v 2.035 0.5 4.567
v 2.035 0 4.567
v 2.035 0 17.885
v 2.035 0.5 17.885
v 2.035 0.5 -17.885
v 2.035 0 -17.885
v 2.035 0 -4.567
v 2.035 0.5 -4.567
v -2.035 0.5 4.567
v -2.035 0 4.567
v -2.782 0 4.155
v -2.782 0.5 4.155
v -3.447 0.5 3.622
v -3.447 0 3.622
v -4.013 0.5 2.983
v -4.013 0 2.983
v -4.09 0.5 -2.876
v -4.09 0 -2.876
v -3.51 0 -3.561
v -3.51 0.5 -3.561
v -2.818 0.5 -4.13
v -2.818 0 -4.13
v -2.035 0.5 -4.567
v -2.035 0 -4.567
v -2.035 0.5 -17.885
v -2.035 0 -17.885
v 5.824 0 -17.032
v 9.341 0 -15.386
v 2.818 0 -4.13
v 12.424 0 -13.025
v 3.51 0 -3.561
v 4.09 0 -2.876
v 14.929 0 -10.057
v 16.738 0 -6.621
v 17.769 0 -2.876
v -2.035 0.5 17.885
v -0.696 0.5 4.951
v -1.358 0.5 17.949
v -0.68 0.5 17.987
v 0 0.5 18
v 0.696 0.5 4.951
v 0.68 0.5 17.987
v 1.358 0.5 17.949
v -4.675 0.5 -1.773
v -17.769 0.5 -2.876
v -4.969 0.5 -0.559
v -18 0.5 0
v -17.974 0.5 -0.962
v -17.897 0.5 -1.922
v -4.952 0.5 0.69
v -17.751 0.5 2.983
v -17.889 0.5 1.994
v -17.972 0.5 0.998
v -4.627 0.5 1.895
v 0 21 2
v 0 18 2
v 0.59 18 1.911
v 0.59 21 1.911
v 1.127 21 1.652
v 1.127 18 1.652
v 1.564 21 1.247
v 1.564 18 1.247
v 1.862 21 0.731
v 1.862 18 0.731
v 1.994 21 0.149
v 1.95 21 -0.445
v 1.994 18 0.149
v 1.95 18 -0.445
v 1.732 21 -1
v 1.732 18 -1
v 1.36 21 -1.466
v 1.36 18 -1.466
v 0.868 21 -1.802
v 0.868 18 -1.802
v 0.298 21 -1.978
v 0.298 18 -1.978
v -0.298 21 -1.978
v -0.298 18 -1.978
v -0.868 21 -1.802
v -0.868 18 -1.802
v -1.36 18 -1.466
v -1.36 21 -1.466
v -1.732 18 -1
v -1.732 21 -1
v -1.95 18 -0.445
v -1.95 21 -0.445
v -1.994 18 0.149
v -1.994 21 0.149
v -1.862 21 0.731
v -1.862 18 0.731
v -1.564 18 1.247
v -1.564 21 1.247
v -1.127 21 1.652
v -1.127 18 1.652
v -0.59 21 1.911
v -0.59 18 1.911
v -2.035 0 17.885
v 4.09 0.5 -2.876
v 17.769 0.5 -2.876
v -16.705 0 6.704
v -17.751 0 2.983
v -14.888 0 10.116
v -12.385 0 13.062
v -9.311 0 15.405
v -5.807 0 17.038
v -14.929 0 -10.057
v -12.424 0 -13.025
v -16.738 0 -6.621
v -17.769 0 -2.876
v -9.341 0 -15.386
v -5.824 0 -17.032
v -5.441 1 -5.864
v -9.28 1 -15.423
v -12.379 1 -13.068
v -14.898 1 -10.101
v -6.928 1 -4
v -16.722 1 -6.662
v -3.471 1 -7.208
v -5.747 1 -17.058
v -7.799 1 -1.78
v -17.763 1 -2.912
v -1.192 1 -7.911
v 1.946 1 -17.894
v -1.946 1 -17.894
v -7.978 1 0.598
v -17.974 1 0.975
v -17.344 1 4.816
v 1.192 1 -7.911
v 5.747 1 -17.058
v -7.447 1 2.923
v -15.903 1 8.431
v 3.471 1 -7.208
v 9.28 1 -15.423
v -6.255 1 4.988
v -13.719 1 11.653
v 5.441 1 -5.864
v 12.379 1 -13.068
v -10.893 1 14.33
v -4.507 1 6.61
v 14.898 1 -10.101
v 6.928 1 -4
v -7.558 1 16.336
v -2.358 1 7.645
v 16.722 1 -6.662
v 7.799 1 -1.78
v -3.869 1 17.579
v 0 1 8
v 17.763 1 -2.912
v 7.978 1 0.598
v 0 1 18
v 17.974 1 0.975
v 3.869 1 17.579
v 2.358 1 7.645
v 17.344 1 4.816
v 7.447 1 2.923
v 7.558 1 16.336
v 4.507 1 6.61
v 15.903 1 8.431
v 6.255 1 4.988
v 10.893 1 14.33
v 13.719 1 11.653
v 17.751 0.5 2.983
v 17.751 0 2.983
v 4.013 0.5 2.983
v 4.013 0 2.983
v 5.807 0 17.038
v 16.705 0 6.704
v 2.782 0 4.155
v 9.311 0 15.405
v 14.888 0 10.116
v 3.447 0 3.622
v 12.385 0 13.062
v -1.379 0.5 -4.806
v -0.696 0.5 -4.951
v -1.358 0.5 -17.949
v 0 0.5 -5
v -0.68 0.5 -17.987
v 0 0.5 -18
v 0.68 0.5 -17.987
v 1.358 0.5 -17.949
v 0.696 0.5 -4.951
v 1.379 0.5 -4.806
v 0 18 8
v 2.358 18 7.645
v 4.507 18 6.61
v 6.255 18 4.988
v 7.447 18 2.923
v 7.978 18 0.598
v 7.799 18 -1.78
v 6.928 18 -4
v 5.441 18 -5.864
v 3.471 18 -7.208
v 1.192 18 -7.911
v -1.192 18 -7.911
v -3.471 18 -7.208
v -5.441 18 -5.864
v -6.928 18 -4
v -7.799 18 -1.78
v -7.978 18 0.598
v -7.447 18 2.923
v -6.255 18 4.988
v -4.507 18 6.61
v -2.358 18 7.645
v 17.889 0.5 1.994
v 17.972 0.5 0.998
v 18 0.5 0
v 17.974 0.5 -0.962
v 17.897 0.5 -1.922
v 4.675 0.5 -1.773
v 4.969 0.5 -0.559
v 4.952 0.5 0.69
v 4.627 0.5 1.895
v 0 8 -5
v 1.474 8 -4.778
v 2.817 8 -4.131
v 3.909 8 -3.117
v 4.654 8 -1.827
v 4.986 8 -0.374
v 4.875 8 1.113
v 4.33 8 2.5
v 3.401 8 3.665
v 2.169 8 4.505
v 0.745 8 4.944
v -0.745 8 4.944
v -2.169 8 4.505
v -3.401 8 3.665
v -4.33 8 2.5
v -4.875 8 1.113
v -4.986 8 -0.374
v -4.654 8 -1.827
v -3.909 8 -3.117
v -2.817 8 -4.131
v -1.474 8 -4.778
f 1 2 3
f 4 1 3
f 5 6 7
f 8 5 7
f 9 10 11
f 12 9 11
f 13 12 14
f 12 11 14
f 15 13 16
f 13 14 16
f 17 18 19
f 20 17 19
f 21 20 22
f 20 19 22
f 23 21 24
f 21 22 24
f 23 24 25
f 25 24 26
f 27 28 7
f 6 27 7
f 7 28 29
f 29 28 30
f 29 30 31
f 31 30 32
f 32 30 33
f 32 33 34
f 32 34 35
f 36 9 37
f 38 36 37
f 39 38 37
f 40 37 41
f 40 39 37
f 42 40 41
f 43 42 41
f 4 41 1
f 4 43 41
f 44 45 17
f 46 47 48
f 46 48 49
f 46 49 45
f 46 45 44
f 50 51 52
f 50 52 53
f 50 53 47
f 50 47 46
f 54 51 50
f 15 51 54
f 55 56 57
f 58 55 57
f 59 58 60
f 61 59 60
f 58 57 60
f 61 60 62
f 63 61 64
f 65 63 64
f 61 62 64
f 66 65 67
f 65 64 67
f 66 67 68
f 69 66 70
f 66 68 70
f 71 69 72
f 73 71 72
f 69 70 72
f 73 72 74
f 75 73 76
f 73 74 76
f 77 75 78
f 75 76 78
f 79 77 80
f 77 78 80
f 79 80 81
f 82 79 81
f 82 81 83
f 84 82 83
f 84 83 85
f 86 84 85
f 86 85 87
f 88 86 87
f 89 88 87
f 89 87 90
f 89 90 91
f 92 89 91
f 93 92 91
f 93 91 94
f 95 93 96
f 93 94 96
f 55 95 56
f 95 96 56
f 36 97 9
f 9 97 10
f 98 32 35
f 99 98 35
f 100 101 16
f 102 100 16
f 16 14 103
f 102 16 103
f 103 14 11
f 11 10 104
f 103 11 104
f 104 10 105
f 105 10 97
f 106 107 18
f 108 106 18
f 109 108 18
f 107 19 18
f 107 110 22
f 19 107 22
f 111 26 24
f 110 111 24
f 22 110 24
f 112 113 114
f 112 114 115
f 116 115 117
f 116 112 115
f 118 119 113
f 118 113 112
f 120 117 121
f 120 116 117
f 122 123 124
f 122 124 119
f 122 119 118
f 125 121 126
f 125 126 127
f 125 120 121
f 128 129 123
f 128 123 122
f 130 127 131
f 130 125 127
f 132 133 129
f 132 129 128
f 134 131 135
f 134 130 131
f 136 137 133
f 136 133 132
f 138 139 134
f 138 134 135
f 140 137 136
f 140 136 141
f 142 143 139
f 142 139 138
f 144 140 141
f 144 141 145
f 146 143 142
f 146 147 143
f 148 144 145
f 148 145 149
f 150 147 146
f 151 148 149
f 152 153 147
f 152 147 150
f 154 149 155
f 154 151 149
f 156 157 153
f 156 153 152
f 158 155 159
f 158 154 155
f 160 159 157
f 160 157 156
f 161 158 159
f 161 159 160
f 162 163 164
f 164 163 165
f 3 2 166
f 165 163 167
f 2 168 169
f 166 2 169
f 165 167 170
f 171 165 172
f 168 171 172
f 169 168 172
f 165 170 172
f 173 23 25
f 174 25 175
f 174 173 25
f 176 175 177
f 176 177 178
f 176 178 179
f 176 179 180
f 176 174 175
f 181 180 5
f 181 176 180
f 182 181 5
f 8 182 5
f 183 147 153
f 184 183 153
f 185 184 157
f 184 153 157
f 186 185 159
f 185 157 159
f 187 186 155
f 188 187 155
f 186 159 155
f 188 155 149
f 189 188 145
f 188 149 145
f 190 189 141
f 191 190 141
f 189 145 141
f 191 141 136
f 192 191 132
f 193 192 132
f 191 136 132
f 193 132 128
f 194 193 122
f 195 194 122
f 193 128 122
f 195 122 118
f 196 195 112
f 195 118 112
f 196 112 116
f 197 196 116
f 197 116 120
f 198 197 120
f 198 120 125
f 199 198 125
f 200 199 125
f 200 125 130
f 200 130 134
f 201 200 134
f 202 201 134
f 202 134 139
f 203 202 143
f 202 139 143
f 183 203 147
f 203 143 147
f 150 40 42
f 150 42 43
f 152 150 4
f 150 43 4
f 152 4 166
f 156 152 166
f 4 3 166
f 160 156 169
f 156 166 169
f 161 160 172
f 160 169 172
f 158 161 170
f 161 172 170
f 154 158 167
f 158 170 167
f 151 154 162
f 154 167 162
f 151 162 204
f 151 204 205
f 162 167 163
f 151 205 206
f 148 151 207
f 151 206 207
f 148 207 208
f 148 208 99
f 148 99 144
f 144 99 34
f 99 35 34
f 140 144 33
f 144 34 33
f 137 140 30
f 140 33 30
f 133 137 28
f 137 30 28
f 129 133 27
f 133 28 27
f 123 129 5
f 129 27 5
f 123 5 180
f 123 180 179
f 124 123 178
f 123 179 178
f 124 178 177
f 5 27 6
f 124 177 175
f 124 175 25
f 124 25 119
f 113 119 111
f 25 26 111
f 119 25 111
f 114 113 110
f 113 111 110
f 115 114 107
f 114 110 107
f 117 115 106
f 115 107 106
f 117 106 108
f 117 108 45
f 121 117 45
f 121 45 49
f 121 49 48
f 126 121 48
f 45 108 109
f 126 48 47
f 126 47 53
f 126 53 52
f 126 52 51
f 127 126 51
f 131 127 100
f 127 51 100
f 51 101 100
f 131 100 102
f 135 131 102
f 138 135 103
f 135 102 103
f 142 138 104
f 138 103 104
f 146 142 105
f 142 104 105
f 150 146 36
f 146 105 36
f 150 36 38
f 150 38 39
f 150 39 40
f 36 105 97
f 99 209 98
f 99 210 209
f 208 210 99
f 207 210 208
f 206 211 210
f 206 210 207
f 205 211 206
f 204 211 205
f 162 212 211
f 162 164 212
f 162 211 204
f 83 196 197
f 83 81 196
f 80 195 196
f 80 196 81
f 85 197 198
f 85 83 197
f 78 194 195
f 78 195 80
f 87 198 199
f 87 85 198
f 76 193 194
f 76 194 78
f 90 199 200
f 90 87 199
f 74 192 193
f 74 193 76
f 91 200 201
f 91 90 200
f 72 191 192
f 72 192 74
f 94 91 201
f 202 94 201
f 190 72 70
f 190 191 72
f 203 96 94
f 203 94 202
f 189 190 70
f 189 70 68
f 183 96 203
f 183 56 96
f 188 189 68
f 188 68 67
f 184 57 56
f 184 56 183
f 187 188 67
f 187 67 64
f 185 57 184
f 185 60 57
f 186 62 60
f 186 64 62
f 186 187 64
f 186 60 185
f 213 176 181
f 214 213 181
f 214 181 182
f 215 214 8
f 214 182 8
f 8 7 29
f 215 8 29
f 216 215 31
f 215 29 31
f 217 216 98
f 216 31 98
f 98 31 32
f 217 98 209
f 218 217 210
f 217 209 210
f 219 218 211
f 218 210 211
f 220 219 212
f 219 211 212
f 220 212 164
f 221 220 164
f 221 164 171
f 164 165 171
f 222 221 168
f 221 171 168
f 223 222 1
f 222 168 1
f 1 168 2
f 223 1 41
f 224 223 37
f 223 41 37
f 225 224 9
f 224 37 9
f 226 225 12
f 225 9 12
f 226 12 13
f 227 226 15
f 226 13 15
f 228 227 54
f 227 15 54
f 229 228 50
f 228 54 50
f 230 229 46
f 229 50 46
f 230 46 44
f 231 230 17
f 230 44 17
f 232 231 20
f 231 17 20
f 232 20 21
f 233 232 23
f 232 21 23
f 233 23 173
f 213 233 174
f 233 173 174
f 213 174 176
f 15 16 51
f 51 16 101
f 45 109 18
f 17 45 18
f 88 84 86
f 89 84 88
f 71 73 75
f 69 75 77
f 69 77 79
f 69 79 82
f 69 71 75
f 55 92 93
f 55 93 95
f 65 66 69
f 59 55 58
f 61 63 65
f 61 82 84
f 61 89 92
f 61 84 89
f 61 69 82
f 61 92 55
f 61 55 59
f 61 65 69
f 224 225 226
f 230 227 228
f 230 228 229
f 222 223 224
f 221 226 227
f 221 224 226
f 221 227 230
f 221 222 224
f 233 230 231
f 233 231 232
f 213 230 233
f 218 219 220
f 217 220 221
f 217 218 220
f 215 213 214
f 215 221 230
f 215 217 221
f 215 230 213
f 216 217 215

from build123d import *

# Parameters (mm, degrees)
SKETCH_1_R          = 18
EXTRUDE_1_DEPTH     = 1
SKETCH_2_R          = 8
EXTRUDE_2_DEPTH     = 17
SKETCH_3_R          = 2
EXTRUDE_3_DEPTH     = 3
SKETCH_4_R          = 5
CUT_EXTRUDE_1_DEPTH = 8
SKETCH_5_W          = 4.070351758
SKETCH_5_H          = 5.859394111
CUT_EXTRUDE_2_DEPTH = 0.5


with BuildPart() as part:
    # Эскиз1 → Бобышка-Вытянуть1 (new body)
    with BuildSketch(Plane(origin=(0, 0, 0), x_dir=(1, 0, 0), z_dir=(0, 1, 0))):
        with Locations(Location((0, 0, 0), (0, 0, 270))):
            Circle(SKETCH_1_R)
    extrude(amount=EXTRUDE_1_DEPTH)

    # Эскиз2 → Бобышка-Вытянуть2 (add)
    with BuildSketch(Plane(origin=(0, 1, 0), x_dir=(1, 0, 0), z_dir=(0, 1, 0))):
        with Locations(Location((0, 0, 0), (0, 0, 270))):
            Circle(SKETCH_2_R)
    extrude(amount=EXTRUDE_2_DEPTH)

    # Эскиз3 → Бобышка-Вытянуть3 (add)
    with BuildSketch(Plane(origin=(0, 18, 0), x_dir=(1, 0, 0), z_dir=(0, 1, 0))):
        with Locations(Location((0, 0, 0), (0, 0, 270))):
            Circle(SKETCH_3_R)
    extrude(amount=EXTRUDE_3_DEPTH)

    # Эскиз4 → Вырез-Вытянуть1 (cut)
    with BuildSketch(Plane.XZ):
        with Locations(Location((0, 0, 0), (0, 0, 270))):
            Circle(SKETCH_4_R)
    extrude(amount=-CUT_EXTRUDE_1_DEPTH, mode=Mode.SUBTRACT)

    # Эскиз5 → Вырез-Вытянуть2 (cut)
    with BuildSketch(Plane.XZ):
        with BuildLine():
            Line((-4.012728592, 2.982953109), (-17.751112381, 2.982953109))
            ThreePointArc((-17.751112381, 2.982953109), (-17.937670178, 1.496659138), (-18, 0))
            ThreePointArc((-18, 0), (-17.942077496, -1.442863516), (-17.768682764, -2.876441002))
            Line((-17.768682764, -2.876441002), (-4.089753924, -2.876441002))
            ThreePointArc((-4.089753924, -2.876441002), (-4.999568038, 0.065722391), (-4.012728592, 2.982953109))
        make_face()
        with BuildLine():
            ThreePointArc((18, 0), (17.937670178, 1.496659138), (17.751112381, 2.982953109))
            Line((17.751112381, 2.982953109), (4.012728592, 2.982953109))
            ThreePointArc((4.012728592, 2.982953109), (4.746769584, 1.571043768), (5, 0))
            ThreePointArc((5, 0), (4.767010049, -1.508514232), (4.089753924, -2.876441002))
            Line((4.089753924, -2.876441002), (17.768682764, -2.876441002))
            ThreePointArc((17.768682764, -2.876441002), (17.942077496, -1.442863516), (18, 0))
        make_face()
        with BuildLine():
            Line((-2.035175879, -2.876441002), (-2.035175879, 2.982953109))
            Line((-2.035175879, 2.982953109), (-4.012728592, 2.982953109))
            ThreePointArc((-4.012728592, 2.982953109), (-4.999568038, 0.065722391), (-4.089753924, -2.876441002))
            Line((-4.089753924, -2.876441002), (-2.035175879, -2.876441002))
        make_face()
        with BuildLine():
            Line((4.012728592, 2.982953109), (2.035175879, 2.982953109))
            Line((2.035175879, 2.982953109), (2.035175879, -2.876441002))
            Line((2.035175879, -2.876441002), (4.089753924, -2.876441002))
            ThreePointArc((4.089753924, -2.876441002), (4.767010049, -1.508514232), (5, 0))
            ThreePointArc((5, 0), (4.746769584, 1.571043768), (4.012728592, 2.982953109))
        make_face()
        with BuildLine():
            ThreePointArc((4.012728592, 2.982953109), (3.125961884, 3.902353431), (2.035175879, 4.567062419))
            Line((2.035175879, 4.567062419), (2.035175879, 2.982953109))
            Line((2.035175879, 2.982953109), (4.012728592, 2.982953109))
        make_face()
        with BuildLine():
            ThreePointArc((2.035175879, 4.567062419), (0, 5), (-2.035175879, 4.567062419))
            Line((-2.035175879, 4.567062419), (-2.035175879, 2.982953109))
            Line((-2.035175879, 2.982953109), (2.035175879, 2.982953109))
            Line((2.035175879, 2.982953109), (2.035175879, 4.567062419))
        make_face()
        with BuildLine():
            ThreePointArc((2.035175879, 17.884576012), (1.019223179, 17.971120836), (0, 18))
            ThreePointArc((0, 18), (-1.019223179, 17.971120836), (-2.035175879, 17.884576012))
            Line((-2.035175879, 17.884576012), (-2.035175879, 4.567062419))
            ThreePointArc((-2.035175879, 4.567062419), (0, 5), (2.035175879, 4.567062419))
            Line((2.035175879, 4.567062419), (2.035175879, 17.884576012))
        make_face()
        with BuildLine():
            ThreePointArc((2.035175879, -4.567062419), (0, -5), (-2.035175879, -4.567062419))
            Line((-2.035175879, -4.567062419), (-2.035175879, -17.884576012))
            ThreePointArc((-2.035175879, -17.884576012), (-1.019223179, -17.971120836), (0, -18))
            ThreePointArc((0, -18), (1.019223179, -17.971120836), (2.035175879, -17.884576012))
            Line((2.035175879, -17.884576012), (2.035175879, -4.567062419))
        make_face()
        with Locations((0, 0.053256054)):
            Rectangle(SKETCH_5_W, SKETCH_5_H)
        with BuildLine():
            Line((4.089753924, -2.876441002), (2.035175879, -2.876441002))
            Line((2.035175879, -2.876441002), (2.035175879, -4.567062419))
            ThreePointArc((2.035175879, -4.567062419), (3.176986224, -3.86092716), (4.089753924, -2.876441002))
        make_face()
        with BuildLine():
            Line((2.035175879, -2.876441002), (-2.035175879, -2.876441002))
            Line((-2.035175879, -2.876441002), (-2.035175879, -4.567062419))
            ThreePointArc((-2.035175879, -4.567062419), (0, -5), (2.035175879, -4.567062419))
            Line((2.035175879, -4.567062419), (2.035175879, -2.876441002))
        make_face()
        with BuildLine():
            Line((-2.035175879, -4.567062419), (-2.035175879, -2.876441002))
            Line((-2.035175879, -2.876441002), (-4.089753924, -2.876441002))
            ThreePointArc((-4.089753924, -2.876441002), (-3.176986224, -3.86092716), (-2.035175879, -4.567062419))
        make_face()
        with BuildLine():
            Line((-2.035175879, 2.982953109), (-2.035175879, 4.567062419))
            ThreePointArc((-2.035175879, 4.567062419), (-3.125961884, 3.902353431), (-4.012728592, 2.982953109))
            Line((-4.012728592, 2.982953109), (-2.035175879, 2.982953109))
        make_face()
    extrude(amount=-CUT_EXTRUDE_2_DEPTH, mode=Mode.SUBTRACT)


solid = part.part
